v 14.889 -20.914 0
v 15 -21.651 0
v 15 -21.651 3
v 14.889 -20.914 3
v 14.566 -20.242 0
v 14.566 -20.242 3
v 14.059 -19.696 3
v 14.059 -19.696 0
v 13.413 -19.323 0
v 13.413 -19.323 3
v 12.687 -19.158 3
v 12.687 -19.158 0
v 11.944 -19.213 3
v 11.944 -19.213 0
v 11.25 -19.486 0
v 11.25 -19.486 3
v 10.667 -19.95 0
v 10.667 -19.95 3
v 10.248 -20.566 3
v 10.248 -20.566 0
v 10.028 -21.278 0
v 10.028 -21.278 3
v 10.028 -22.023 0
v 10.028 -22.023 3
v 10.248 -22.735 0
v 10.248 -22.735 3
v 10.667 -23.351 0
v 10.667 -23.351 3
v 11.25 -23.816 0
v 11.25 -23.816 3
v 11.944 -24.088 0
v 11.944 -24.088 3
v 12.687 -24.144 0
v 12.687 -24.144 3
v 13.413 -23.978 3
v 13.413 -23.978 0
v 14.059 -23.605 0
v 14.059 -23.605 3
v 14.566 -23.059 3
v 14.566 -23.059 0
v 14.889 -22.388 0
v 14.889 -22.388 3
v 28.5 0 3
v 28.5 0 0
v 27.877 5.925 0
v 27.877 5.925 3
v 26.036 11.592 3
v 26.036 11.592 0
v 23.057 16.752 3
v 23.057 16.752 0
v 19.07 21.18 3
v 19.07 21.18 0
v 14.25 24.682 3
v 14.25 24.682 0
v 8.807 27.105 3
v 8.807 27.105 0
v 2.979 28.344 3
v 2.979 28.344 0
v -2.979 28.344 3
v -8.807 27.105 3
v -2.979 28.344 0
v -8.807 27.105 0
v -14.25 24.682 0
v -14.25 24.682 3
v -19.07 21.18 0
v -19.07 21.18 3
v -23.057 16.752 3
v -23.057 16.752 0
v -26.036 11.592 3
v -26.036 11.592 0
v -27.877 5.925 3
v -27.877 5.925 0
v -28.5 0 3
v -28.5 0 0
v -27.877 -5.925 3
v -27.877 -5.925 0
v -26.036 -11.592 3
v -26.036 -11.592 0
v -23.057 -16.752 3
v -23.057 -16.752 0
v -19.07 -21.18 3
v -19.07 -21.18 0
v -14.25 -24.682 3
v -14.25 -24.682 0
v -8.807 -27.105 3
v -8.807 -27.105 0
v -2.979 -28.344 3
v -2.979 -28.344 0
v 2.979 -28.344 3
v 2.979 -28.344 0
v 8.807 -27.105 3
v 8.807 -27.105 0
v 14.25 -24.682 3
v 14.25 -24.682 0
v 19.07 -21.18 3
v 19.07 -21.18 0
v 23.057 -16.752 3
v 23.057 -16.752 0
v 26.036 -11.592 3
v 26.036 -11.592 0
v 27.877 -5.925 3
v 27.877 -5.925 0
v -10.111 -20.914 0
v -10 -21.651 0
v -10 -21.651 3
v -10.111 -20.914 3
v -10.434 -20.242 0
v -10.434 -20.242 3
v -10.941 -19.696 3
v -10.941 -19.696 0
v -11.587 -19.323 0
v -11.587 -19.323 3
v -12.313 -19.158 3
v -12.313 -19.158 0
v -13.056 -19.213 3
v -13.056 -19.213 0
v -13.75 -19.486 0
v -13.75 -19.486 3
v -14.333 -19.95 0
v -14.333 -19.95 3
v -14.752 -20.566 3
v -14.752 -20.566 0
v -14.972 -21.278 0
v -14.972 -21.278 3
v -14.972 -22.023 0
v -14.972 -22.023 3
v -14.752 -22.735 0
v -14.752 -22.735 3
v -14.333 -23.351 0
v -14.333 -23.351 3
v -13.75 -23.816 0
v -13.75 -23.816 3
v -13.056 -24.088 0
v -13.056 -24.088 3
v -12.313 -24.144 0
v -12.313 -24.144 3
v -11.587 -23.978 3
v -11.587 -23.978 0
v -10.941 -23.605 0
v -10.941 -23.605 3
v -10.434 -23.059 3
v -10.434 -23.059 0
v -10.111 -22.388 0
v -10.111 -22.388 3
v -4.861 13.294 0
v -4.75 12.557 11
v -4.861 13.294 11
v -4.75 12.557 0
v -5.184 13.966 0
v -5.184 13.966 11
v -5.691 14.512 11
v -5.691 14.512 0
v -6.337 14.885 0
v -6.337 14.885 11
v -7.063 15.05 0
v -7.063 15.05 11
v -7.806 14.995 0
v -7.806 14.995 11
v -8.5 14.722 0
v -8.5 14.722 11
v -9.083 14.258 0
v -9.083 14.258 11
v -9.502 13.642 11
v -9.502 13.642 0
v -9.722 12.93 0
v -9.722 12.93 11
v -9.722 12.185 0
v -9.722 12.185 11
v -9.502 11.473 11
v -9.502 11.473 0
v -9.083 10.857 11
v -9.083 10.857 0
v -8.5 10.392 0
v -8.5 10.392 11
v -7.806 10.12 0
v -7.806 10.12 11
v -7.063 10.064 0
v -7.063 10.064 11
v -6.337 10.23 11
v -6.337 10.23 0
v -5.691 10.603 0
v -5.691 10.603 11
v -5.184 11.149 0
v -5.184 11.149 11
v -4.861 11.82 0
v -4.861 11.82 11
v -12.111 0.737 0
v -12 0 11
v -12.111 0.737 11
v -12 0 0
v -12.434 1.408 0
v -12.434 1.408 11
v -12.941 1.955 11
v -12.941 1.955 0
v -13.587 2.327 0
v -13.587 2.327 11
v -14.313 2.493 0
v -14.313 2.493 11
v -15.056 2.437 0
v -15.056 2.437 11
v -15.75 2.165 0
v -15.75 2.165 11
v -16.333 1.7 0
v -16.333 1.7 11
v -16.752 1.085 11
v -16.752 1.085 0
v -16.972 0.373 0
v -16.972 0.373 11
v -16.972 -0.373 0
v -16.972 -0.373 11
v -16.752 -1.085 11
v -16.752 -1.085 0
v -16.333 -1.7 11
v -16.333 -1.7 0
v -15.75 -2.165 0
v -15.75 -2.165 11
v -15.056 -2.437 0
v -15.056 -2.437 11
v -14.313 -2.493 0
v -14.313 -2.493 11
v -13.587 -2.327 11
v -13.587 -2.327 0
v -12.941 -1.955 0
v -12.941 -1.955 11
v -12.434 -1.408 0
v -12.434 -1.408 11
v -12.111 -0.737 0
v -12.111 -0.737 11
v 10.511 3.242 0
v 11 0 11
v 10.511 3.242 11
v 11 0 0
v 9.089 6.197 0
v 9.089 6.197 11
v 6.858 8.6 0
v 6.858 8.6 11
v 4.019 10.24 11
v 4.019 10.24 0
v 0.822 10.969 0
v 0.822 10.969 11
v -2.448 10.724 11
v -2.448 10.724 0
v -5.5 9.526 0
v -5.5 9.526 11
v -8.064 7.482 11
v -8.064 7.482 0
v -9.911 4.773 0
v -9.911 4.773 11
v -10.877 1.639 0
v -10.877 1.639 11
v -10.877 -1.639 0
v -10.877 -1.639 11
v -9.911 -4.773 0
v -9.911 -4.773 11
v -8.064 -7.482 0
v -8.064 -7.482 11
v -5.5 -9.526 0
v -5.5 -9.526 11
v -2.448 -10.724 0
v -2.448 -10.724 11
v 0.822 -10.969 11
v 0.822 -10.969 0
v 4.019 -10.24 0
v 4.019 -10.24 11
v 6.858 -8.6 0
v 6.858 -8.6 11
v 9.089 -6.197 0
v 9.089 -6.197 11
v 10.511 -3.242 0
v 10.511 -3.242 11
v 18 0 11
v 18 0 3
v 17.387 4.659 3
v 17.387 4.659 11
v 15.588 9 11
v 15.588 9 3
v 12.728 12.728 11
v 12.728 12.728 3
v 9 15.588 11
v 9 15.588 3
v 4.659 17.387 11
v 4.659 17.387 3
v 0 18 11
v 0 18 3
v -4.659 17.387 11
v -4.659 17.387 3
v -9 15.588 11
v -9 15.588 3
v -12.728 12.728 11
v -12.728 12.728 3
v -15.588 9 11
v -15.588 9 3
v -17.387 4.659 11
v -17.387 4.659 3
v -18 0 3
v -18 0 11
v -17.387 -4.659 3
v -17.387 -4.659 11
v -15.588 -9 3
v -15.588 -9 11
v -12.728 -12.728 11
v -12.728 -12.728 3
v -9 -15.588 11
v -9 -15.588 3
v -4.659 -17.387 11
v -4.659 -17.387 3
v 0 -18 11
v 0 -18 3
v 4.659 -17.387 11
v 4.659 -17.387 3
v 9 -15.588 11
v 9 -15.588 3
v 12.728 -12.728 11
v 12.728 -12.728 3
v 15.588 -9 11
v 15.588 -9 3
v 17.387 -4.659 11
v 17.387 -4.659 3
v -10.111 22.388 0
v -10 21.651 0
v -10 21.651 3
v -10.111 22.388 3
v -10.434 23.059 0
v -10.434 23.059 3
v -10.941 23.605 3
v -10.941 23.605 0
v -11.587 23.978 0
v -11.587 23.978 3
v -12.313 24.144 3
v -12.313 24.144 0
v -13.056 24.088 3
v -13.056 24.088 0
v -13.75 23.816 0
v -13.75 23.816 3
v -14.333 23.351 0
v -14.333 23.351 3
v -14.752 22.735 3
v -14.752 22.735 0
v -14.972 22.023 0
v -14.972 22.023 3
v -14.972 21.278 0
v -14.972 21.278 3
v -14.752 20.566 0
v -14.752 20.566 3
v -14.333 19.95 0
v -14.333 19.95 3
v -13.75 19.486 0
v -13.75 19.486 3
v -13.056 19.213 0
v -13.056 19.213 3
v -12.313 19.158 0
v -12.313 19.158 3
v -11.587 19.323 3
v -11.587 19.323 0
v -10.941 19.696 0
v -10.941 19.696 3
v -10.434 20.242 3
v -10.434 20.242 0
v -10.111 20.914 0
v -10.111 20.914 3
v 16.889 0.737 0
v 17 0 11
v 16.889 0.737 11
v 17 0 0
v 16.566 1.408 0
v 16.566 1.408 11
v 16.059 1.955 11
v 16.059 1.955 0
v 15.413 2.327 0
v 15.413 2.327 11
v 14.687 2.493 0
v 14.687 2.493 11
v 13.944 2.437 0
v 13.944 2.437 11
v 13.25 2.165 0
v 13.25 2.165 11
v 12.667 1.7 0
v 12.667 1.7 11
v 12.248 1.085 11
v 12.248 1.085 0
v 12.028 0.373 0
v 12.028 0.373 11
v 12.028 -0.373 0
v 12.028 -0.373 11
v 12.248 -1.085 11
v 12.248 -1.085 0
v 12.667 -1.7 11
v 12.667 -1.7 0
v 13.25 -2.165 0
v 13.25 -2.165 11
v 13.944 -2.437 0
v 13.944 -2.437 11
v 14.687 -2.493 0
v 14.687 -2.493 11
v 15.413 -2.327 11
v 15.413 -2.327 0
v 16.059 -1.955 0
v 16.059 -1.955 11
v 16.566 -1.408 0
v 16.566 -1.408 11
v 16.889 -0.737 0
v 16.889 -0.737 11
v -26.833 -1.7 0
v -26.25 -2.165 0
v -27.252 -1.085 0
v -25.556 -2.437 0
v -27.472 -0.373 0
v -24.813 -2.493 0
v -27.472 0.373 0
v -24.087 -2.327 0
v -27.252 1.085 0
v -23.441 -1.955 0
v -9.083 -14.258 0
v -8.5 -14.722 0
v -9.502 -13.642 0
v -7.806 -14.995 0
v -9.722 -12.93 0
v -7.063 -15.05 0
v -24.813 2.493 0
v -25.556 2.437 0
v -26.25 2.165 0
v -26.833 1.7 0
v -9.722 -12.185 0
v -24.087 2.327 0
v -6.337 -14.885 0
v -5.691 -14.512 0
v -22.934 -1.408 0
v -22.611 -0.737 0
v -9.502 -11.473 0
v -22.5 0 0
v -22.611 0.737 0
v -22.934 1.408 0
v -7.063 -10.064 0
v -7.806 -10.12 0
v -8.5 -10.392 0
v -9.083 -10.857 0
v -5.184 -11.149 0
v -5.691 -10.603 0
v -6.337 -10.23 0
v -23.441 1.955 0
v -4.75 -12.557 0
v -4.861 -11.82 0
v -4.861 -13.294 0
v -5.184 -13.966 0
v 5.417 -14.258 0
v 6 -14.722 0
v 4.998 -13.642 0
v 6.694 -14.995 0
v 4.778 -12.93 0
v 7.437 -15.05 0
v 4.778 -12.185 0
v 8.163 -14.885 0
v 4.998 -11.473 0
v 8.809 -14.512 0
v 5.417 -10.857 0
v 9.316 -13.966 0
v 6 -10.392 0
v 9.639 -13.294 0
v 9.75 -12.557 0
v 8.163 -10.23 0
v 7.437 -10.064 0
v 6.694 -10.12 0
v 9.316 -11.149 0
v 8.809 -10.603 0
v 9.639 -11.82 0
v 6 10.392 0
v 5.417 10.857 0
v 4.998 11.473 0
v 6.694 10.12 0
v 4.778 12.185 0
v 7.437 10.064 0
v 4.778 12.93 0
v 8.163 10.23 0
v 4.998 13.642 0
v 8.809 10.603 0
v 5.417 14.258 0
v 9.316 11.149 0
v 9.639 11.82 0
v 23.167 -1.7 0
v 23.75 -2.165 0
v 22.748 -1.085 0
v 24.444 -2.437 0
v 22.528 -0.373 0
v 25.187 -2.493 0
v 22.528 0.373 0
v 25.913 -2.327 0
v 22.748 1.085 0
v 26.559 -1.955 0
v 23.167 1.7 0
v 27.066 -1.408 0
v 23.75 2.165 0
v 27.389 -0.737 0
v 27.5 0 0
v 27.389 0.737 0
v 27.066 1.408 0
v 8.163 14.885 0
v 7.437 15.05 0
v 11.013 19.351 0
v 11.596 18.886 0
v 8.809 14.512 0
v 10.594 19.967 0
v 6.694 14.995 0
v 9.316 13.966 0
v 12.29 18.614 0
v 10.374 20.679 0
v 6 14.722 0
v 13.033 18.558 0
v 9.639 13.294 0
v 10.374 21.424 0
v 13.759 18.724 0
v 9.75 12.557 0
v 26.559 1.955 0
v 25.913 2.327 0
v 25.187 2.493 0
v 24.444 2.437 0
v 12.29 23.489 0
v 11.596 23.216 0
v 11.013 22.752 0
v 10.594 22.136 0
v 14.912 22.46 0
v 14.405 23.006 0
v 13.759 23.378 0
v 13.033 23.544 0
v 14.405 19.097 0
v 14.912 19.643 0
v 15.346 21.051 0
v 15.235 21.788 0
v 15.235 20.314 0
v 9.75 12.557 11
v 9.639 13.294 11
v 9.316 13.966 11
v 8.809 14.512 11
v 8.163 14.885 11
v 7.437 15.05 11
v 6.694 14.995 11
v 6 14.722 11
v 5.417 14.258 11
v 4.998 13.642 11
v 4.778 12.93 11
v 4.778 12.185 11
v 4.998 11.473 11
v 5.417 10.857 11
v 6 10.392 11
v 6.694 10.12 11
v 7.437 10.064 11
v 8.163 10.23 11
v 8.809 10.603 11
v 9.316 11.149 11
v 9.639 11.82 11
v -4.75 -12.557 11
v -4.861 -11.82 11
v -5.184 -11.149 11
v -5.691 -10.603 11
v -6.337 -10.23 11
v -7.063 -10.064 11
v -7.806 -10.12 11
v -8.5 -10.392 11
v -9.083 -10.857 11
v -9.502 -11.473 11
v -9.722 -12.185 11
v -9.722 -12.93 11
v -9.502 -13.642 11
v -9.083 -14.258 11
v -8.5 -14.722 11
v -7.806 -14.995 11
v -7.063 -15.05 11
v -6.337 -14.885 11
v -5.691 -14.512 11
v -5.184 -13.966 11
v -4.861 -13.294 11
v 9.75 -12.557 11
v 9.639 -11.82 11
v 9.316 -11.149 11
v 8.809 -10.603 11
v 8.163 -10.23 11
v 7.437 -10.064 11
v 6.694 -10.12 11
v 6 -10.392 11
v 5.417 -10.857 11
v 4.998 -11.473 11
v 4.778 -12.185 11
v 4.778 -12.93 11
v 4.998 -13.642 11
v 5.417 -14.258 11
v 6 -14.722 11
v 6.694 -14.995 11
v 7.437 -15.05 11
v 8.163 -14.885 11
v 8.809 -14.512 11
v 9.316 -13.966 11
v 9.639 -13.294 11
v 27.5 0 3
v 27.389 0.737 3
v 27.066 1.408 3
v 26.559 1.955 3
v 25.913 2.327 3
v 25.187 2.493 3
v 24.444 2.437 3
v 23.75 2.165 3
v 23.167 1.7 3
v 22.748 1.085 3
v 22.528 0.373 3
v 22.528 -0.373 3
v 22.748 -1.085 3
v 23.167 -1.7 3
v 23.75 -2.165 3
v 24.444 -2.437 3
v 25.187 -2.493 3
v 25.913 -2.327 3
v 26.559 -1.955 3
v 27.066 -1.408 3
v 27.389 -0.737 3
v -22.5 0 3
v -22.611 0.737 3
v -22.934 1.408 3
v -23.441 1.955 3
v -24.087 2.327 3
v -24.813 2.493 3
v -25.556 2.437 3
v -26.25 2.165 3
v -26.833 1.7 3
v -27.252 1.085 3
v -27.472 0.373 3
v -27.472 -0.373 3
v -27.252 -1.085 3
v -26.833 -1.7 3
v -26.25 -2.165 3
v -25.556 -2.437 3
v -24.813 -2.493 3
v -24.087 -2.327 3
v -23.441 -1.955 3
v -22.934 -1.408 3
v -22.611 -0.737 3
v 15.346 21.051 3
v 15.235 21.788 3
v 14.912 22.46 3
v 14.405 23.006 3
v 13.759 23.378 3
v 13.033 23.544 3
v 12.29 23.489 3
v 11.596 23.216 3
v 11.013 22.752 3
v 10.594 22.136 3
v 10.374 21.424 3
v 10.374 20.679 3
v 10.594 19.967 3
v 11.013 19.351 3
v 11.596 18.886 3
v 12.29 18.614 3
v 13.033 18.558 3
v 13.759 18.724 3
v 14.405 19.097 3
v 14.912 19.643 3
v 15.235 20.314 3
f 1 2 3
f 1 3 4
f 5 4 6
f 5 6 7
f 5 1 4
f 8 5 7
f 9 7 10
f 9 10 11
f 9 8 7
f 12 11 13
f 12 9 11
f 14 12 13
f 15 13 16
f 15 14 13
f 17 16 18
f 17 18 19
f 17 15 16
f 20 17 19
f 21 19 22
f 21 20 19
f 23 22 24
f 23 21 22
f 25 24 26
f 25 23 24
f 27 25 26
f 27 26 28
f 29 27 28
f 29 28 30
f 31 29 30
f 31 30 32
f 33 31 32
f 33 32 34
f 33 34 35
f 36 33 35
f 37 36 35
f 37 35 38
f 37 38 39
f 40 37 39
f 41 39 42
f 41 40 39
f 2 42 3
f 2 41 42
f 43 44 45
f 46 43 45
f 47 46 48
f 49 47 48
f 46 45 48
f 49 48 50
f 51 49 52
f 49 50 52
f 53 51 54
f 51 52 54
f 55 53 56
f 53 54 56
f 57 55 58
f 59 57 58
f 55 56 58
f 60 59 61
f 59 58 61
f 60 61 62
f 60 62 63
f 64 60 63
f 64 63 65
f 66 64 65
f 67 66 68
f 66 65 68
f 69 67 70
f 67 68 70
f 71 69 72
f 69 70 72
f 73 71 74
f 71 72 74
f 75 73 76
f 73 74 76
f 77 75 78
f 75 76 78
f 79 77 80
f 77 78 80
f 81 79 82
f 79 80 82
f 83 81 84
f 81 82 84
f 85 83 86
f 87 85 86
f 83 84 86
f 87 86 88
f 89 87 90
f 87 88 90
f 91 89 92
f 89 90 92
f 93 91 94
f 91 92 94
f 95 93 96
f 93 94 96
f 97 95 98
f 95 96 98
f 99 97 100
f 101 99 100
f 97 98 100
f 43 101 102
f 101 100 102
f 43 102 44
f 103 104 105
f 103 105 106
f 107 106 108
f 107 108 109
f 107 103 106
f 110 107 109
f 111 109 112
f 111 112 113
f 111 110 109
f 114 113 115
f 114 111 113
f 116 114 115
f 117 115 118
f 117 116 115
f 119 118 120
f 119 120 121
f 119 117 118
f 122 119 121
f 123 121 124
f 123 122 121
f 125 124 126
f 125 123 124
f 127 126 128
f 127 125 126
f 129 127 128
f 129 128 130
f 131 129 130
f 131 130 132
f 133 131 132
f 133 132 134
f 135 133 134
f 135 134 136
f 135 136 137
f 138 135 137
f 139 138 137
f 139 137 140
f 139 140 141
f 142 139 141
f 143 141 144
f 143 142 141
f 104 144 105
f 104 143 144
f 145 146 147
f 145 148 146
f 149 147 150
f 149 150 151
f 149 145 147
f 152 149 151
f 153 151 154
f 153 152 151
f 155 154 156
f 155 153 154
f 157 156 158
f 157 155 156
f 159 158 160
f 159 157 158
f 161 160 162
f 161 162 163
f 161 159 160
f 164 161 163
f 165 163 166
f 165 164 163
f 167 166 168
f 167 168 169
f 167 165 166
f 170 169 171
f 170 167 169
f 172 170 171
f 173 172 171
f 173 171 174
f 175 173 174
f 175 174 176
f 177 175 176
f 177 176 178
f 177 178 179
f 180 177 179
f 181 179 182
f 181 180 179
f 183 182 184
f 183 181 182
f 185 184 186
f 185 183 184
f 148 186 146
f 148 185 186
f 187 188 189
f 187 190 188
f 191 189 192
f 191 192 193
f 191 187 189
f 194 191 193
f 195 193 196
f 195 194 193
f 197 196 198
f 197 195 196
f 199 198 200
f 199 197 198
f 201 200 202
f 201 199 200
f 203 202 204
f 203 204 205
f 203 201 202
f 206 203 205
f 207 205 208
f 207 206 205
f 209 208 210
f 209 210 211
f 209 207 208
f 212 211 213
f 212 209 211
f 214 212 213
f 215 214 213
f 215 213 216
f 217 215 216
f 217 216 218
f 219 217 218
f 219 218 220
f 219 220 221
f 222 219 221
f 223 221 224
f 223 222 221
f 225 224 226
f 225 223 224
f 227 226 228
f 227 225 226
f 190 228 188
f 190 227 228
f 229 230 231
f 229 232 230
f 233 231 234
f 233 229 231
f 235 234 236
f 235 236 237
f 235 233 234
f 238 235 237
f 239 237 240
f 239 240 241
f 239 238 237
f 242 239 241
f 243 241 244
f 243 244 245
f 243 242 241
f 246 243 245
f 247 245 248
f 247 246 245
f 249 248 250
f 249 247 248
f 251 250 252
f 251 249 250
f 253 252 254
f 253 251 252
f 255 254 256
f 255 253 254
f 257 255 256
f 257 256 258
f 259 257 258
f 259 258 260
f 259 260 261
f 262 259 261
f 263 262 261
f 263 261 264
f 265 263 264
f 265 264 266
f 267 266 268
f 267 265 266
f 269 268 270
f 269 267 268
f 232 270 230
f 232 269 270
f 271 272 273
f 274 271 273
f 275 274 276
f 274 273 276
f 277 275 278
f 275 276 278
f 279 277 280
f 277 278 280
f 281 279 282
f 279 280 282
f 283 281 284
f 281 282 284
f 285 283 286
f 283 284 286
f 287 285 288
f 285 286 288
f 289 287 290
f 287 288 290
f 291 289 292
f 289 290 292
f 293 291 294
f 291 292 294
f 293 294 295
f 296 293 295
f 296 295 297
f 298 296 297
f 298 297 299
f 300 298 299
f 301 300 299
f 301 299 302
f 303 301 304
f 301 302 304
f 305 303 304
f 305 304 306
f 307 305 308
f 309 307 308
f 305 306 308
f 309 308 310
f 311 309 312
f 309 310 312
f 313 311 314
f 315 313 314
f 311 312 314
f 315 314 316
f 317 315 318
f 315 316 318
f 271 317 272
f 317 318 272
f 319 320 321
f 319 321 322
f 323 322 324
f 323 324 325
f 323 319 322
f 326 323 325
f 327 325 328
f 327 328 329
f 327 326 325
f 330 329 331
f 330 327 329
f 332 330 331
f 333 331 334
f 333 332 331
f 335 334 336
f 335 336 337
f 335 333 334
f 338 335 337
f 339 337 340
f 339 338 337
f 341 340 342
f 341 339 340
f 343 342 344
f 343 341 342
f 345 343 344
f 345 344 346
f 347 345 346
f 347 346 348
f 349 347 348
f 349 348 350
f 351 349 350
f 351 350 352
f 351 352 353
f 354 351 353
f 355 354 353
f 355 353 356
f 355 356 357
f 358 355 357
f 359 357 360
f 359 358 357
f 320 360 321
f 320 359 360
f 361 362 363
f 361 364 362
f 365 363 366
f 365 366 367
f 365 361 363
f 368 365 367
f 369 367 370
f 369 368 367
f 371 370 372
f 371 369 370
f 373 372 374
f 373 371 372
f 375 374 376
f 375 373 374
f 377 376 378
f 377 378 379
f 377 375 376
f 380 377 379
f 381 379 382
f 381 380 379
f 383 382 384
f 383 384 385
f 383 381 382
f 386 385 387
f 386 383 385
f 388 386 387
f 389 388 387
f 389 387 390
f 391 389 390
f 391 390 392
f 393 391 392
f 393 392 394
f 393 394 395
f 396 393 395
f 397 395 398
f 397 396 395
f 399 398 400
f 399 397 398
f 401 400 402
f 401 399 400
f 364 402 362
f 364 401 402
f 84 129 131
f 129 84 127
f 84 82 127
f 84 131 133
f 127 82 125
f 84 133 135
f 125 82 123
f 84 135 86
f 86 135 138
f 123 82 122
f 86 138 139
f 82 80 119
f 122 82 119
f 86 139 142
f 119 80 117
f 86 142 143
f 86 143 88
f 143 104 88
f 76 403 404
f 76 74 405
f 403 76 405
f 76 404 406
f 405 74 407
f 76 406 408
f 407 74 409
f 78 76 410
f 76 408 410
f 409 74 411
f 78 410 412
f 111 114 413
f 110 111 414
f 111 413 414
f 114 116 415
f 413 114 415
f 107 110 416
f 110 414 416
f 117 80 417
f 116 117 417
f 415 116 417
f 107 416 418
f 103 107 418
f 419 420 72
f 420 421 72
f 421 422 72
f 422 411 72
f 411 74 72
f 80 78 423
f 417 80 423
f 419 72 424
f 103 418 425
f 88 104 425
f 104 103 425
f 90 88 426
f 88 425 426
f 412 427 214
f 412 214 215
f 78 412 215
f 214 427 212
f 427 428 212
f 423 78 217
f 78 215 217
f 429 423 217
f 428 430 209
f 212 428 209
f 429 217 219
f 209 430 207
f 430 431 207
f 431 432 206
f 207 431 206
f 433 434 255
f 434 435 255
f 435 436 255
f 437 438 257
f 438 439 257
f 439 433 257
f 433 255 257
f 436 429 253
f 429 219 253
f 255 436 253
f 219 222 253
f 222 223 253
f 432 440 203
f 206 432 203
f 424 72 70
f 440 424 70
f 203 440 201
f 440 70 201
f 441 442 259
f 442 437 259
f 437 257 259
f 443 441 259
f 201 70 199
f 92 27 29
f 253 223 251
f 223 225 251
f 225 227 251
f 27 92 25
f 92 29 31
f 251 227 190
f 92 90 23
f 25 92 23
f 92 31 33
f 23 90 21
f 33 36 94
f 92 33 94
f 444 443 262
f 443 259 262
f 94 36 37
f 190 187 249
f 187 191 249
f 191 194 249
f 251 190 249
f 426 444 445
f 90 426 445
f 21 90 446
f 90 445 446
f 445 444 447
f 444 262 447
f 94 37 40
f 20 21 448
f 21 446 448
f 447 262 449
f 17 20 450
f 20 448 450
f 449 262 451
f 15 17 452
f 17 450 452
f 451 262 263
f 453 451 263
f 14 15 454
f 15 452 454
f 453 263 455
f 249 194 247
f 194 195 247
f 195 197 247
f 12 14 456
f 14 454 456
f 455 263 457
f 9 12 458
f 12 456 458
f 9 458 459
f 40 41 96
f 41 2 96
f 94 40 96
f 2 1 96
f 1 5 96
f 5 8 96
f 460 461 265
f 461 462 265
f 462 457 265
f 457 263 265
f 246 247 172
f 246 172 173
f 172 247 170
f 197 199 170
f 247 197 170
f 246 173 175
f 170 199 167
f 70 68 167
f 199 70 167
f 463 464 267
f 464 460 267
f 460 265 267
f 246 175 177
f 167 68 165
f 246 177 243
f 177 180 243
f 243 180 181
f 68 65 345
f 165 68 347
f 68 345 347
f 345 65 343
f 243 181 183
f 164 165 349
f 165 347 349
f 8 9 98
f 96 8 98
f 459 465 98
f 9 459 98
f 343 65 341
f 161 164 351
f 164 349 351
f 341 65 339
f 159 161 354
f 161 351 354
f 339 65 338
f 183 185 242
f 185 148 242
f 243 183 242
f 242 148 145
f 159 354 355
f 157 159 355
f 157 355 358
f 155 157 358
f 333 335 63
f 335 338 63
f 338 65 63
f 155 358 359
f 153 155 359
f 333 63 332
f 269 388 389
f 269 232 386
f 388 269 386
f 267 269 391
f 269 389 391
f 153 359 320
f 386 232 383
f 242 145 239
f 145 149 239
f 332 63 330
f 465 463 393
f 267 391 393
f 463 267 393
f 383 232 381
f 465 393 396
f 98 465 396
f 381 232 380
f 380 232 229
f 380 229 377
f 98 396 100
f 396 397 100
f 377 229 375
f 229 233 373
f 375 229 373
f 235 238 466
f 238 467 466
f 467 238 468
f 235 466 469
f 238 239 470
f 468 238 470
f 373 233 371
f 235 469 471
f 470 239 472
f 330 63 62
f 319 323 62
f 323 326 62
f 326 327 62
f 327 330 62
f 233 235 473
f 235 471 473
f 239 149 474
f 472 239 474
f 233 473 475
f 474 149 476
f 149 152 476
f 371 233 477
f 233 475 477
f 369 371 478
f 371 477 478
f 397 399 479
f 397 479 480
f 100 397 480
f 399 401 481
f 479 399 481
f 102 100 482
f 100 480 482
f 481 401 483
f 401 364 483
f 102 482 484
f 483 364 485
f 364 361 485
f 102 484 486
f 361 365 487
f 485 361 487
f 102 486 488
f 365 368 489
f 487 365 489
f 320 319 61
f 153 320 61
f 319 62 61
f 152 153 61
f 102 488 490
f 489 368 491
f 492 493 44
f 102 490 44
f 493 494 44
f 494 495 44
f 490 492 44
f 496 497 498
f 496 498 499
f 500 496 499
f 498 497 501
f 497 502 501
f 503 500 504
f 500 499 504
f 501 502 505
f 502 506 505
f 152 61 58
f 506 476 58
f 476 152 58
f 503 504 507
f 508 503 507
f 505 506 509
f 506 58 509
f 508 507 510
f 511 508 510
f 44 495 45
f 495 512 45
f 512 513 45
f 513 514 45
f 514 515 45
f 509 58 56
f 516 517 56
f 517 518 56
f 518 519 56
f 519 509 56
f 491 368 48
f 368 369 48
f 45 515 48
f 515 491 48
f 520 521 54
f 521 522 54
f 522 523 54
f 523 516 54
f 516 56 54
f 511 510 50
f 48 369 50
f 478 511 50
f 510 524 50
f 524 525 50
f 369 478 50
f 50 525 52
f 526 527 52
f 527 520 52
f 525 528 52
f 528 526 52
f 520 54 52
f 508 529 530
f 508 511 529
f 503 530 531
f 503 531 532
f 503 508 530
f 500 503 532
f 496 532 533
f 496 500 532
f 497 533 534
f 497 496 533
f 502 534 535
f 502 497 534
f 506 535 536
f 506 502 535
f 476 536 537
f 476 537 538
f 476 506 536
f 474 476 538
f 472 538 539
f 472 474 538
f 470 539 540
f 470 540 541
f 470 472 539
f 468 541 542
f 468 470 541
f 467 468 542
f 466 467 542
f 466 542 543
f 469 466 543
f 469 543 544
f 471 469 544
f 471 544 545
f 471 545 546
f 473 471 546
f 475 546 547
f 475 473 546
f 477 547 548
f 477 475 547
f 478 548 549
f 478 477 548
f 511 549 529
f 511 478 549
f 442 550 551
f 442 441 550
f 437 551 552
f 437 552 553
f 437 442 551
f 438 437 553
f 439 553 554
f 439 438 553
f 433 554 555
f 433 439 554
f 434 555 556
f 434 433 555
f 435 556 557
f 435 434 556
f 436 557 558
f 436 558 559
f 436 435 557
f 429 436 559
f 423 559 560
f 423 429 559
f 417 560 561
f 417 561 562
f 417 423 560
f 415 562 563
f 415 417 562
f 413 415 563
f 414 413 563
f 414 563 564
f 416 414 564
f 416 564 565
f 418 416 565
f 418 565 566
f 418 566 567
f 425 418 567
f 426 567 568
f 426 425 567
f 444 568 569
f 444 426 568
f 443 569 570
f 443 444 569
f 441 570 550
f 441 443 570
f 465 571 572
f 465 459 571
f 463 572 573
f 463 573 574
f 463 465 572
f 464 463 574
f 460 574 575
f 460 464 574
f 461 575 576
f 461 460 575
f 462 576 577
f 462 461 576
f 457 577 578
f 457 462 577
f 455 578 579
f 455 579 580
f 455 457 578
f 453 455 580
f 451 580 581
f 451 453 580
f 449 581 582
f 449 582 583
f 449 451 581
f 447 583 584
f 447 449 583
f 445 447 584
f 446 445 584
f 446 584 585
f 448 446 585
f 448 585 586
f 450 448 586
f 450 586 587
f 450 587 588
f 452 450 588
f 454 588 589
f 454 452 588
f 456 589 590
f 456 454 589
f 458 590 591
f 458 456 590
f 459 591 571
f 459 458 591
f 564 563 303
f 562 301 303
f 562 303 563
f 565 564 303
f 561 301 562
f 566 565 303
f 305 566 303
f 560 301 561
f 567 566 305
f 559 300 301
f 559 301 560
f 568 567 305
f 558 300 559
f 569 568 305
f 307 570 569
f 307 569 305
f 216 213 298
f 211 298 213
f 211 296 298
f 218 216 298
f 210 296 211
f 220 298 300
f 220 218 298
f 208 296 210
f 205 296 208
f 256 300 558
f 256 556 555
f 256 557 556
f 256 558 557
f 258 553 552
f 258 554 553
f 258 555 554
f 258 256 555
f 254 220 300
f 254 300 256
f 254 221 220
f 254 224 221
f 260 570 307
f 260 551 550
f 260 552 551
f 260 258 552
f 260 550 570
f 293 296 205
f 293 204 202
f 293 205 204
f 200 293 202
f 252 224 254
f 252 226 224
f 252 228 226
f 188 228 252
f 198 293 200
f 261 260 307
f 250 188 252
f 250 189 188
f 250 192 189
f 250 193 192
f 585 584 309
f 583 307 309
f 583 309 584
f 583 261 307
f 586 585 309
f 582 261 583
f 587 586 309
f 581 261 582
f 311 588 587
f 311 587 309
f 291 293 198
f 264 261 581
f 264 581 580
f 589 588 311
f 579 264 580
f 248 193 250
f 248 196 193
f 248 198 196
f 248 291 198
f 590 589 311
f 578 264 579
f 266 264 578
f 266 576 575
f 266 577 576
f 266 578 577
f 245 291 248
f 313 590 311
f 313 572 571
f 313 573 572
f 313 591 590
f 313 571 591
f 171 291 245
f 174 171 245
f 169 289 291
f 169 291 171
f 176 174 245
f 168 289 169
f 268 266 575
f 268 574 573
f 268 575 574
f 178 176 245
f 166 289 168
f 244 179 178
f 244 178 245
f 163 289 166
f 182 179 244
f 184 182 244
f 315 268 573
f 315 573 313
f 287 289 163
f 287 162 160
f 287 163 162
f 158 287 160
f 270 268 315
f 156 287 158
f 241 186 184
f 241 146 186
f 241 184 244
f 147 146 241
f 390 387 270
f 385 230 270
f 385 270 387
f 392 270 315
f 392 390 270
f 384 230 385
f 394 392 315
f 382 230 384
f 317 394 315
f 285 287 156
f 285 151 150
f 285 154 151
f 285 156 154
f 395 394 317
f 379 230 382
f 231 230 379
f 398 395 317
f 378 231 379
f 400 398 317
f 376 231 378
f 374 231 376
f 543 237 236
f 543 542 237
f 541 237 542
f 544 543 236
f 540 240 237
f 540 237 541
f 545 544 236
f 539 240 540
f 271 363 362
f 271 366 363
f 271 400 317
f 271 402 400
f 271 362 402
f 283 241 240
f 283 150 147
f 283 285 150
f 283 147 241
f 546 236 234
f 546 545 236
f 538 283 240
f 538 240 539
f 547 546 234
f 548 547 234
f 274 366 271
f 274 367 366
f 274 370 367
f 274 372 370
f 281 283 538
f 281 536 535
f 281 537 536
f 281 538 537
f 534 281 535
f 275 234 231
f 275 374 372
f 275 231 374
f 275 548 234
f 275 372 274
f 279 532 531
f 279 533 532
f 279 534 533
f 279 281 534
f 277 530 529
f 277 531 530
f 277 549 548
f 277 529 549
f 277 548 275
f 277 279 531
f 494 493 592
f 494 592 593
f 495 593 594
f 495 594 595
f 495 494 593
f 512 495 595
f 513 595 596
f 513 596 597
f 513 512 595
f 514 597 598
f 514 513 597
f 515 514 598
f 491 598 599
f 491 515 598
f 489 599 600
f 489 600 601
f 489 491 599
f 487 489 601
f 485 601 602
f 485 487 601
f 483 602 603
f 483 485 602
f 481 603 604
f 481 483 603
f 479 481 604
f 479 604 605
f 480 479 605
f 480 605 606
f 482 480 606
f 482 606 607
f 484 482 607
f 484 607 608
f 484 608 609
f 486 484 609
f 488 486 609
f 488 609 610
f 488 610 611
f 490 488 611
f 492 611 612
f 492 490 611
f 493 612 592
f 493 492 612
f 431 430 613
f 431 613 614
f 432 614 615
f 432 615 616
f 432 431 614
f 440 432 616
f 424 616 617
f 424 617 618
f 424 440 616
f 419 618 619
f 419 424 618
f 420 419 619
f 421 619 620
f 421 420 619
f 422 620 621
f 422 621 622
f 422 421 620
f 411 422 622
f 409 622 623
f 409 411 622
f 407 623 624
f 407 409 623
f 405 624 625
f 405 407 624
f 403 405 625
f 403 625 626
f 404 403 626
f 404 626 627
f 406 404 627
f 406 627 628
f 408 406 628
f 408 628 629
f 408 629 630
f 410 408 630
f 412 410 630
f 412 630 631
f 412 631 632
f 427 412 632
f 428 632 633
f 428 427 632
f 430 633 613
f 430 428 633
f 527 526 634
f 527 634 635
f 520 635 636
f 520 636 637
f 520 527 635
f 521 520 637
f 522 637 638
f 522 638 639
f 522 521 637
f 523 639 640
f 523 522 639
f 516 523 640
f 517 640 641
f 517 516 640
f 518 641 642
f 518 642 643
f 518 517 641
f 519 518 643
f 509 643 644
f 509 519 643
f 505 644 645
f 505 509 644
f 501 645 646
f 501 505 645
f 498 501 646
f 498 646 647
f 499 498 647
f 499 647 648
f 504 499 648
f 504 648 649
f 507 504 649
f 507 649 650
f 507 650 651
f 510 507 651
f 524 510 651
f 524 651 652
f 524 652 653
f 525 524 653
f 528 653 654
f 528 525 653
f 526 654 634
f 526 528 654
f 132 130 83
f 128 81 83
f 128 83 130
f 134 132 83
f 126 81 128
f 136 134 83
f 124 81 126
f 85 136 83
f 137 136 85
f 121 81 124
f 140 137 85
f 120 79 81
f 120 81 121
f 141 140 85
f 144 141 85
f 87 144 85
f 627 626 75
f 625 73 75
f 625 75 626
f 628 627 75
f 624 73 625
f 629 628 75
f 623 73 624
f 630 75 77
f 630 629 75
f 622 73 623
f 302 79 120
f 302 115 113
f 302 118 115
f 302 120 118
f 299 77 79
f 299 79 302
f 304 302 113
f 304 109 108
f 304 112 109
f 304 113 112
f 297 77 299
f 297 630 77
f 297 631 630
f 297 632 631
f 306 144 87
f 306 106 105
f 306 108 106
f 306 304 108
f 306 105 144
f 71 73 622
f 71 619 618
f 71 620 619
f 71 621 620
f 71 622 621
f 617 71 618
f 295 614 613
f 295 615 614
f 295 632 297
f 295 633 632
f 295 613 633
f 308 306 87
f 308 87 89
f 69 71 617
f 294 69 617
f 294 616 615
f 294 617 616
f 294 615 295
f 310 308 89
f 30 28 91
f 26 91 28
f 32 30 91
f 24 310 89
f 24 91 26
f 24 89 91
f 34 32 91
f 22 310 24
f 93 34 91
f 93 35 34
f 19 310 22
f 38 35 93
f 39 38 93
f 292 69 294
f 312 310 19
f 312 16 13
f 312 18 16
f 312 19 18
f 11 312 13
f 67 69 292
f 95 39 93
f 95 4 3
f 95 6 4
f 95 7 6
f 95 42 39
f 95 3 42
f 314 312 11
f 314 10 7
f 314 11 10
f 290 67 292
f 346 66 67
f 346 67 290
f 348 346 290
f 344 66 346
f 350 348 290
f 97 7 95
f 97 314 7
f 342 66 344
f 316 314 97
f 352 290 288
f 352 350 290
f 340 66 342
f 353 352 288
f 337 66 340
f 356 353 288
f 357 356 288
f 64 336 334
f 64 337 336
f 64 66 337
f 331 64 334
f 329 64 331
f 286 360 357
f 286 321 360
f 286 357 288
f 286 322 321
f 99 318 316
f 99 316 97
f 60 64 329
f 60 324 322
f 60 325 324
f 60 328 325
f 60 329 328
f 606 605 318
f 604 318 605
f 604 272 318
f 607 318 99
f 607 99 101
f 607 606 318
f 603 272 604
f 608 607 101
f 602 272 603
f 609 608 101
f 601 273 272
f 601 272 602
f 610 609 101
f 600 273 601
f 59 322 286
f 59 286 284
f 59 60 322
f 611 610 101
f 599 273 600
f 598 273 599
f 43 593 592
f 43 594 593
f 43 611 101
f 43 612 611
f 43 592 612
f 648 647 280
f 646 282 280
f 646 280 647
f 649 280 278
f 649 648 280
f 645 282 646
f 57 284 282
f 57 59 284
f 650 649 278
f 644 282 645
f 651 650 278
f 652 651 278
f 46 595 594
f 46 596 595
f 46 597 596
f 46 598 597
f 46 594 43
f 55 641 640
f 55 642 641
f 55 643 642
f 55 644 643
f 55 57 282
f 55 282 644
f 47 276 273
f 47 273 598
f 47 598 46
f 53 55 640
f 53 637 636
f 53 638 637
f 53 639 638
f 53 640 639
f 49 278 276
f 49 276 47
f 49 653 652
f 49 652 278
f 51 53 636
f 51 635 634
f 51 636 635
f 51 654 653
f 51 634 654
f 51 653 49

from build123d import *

# Parameters (mm, degrees)
SKETCH_1_R      = 28.5
SKETCH_1_R_2    = 2.5
SKETCH_1_R_3    = 18
SKETCH_1_R_4    = 11
EXTRUDE_3_DEPTH = 3
SKETCH_3_R      = 18
SKETCH_3_R_2    = 11
SKETCH_3_R_3    = 2.5
EXTRUDE_4_DEPTH = 8


with BuildPart() as part:
    # 草图1 → 凸台-拉伸3 (new body)
    # profile 1 of 2: a face of its own
    with BuildSketch(Plane.XY):
        Circle(SKETCH_1_R)
        with Locations((-12.5, -21.650635095)):
            Circle(SKETCH_1_R_2, mode=Mode.SUBTRACT)
        with Locations((12.5, -21.650635095)):
            Circle(SKETCH_1_R_2, mode=Mode.SUBTRACT)
        with Locations((25, 0)):
            Circle(SKETCH_1_R_2, mode=Mode.SUBTRACT)
        with Locations((12.846045577, 21.051266574)):
            Circle(SKETCH_1_R_2, mode=Mode.SUBTRACT)
        with Locations((-25, 0)):
            Circle(SKETCH_1_R_2, mode=Mode.SUBTRACT)
        with Locations((-12.5, 21.650635095)):
            Circle(SKETCH_1_R_2, mode=Mode.SUBTRACT)
        Circle(SKETCH_1_R_3, mode=Mode.SUBTRACT)
    # profile 2 of 2: a face of its own
    with BuildSketch(Plane.XY):
        Circle(SKETCH_1_R_3)
        Circle(SKETCH_1_R_4, mode=Mode.SUBTRACT)
        with Locations((-7.25, 12.557368355)):
            Circle(SKETCH_1_R_2, mode=Mode.SUBTRACT)
        with Locations((7.25, 12.557368355)):
            Circle(SKETCH_1_R_2, mode=Mode.SUBTRACT)
        with Locations((-14.5, 0)):
            Circle(SKETCH_1_R_2, mode=Mode.SUBTRACT)
        with Locations((14.5, 0)):
            Circle(SKETCH_1_R_2, mode=Mode.SUBTRACT)
        with Locations((7.25, -12.557368355)):
            Circle(SKETCH_1_R_2, mode=Mode.SUBTRACT)
        with Locations((-7.25, -12.557368355)):
            Circle(SKETCH_1_R_2, mode=Mode.SUBTRACT)
    extrude(amount=EXTRUDE_3_DEPTH)

    # 草图3 → 凸台-拉伸4 (add)
    with BuildSketch(Plane.XY.offset(3)):
        Circle(SKETCH_3_R)
        Circle(SKETCH_3_R_2, mode=Mode.SUBTRACT)
        with Locations((-14.5, 0)):
            Circle(SKETCH_3_R_3, mode=Mode.SUBTRACT)
        with Locations((-7.25, 12.557368355)):
            Circle(SKETCH_3_R_3, mode=Mode.SUBTRACT)
        with Locations((7.25, 12.557368355)):
            Circle(SKETCH_3_R_3, mode=Mode.SUBTRACT)
        with Locations((14.5, 0)):
            Circle(SKETCH_3_R_3, mode=Mode.SUBTRACT)
        with Locations((7.25, -12.557368355)):
            Circle(SKETCH_3_R_3, mode=Mode.SUBTRACT)
        with Locations((-7.25, -12.557368355)):
            Circle(SKETCH_3_R_3, mode=Mode.SUBTRACT)
    extrude(amount=EXTRUDE_4_DEPTH)


solid = part.part
